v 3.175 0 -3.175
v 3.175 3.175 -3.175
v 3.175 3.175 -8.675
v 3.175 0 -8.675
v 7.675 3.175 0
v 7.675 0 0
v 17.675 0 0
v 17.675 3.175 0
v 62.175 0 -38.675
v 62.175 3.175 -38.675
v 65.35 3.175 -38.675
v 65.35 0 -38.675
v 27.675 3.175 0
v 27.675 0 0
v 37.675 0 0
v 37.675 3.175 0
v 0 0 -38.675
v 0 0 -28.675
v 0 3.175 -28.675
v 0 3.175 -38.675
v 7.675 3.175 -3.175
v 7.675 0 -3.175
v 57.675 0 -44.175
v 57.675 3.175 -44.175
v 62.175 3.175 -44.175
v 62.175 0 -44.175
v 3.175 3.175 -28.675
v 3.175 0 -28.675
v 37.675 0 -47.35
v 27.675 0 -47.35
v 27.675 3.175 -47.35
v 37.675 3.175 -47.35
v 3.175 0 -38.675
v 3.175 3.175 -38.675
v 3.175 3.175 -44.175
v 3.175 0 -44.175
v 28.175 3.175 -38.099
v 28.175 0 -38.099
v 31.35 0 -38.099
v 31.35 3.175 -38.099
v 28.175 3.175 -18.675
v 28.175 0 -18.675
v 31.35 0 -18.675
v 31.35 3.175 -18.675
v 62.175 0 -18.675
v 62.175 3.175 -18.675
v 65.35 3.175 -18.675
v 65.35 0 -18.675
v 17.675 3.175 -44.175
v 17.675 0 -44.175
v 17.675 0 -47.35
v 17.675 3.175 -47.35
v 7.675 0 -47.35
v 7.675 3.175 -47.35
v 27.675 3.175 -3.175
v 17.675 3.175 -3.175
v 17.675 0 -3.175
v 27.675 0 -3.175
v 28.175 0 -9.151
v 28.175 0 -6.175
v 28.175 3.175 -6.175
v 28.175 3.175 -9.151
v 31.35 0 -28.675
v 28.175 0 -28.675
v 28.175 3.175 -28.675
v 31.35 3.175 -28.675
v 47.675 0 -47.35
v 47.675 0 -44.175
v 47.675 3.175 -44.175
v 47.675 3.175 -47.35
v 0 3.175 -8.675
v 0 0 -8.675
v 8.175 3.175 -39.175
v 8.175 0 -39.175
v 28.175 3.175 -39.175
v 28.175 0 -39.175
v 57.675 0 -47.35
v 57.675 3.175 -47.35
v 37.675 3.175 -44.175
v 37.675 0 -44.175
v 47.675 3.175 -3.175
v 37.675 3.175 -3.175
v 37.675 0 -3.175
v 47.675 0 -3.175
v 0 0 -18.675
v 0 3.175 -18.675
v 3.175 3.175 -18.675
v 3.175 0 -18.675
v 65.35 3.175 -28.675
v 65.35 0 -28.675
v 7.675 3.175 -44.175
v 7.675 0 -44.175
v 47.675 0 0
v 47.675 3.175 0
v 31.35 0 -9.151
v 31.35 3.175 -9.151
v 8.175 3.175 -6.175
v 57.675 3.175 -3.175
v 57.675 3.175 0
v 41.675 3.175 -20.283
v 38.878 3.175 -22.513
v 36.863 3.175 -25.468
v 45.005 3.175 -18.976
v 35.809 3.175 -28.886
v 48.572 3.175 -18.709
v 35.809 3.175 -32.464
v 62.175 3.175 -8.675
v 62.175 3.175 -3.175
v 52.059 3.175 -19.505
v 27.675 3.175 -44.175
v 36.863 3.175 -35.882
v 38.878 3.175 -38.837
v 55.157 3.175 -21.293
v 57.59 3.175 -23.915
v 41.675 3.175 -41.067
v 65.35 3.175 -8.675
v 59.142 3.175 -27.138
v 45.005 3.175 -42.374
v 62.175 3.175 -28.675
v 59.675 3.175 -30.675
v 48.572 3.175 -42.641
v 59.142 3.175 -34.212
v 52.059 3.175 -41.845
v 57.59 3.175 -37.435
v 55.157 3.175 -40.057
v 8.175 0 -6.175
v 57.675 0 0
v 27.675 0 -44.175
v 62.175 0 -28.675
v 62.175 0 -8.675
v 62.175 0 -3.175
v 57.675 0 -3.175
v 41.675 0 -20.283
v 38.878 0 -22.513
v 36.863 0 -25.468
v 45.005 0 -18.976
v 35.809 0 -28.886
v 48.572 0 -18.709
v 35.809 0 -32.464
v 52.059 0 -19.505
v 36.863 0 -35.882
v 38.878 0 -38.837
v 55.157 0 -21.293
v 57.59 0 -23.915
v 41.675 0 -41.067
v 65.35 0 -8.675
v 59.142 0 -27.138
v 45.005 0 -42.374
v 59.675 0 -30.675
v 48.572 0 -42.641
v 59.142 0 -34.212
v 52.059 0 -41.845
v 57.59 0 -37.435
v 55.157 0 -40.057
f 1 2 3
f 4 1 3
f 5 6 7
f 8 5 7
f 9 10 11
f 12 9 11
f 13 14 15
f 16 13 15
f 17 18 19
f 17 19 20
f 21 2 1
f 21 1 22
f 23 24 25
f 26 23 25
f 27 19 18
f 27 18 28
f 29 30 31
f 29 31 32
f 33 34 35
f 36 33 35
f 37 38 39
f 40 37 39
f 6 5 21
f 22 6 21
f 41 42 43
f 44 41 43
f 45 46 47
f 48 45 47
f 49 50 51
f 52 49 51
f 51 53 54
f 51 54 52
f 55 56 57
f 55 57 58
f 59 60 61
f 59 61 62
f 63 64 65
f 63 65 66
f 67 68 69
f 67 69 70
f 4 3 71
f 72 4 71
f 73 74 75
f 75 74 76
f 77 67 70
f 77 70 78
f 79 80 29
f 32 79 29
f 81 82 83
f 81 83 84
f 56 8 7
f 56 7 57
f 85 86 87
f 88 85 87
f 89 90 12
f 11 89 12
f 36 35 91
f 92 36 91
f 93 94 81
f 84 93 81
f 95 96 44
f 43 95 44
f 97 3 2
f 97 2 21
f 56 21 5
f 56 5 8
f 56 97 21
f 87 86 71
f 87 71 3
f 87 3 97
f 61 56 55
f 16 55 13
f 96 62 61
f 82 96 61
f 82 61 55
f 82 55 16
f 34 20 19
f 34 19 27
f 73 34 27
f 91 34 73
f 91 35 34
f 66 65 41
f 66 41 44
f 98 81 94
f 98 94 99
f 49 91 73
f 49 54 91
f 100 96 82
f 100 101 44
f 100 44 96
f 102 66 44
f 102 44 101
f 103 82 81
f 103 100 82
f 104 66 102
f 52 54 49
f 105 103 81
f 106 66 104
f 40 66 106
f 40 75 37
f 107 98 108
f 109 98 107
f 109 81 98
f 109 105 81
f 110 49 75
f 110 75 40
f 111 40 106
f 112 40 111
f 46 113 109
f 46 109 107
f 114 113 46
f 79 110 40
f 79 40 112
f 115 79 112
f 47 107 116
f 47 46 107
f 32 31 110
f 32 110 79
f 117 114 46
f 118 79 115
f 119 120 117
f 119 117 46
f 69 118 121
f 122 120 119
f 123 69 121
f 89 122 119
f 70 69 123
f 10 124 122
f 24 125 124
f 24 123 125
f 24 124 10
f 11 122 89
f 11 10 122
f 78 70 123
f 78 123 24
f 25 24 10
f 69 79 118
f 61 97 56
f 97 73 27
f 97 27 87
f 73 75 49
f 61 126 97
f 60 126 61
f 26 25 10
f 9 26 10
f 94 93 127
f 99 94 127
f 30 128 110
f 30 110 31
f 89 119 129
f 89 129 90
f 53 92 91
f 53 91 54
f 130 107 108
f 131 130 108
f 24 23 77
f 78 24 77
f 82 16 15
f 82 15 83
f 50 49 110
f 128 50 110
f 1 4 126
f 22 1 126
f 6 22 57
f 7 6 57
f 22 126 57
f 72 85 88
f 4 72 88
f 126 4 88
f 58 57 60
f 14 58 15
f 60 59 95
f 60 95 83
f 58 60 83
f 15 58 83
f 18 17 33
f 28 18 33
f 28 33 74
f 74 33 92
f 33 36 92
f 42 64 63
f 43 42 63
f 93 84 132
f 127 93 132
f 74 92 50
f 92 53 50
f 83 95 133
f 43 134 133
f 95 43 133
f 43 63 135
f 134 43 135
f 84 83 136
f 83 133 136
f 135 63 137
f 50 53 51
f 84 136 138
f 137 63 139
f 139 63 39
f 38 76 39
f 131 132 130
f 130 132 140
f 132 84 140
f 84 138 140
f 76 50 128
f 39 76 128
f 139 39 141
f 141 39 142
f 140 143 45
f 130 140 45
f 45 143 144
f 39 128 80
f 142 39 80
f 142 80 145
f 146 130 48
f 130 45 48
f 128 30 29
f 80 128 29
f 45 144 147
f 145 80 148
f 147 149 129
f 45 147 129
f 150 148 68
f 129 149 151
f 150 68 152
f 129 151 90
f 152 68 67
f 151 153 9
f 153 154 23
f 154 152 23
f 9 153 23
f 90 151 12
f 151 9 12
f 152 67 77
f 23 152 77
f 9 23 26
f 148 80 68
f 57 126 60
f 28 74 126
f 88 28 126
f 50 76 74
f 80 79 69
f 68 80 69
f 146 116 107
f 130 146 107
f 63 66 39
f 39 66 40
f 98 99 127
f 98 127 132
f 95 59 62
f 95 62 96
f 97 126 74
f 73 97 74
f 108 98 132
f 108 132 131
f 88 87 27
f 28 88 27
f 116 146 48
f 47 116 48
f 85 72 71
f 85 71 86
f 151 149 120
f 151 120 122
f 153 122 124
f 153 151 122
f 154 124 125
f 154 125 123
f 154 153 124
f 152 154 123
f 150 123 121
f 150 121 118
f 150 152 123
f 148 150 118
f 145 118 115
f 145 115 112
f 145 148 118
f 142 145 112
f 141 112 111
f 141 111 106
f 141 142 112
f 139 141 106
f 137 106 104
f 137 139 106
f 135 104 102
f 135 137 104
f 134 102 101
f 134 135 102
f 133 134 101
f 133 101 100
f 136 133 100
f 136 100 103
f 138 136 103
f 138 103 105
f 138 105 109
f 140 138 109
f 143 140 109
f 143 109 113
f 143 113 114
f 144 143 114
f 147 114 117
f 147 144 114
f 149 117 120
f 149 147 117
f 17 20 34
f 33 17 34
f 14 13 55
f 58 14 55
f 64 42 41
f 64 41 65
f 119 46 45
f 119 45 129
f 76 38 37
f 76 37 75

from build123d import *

# Parameters (mm, degrees)
SKETCH1_W           = 65.35
SKETCH1_H           = 47.35
SKETCH1_R           = 12
SKETCH1_W_2         = 20
SKETCH1_H_2         = 33
BOSS_EXTRUDE1_DEPTH = 3.175
SKETCH2_W           = 10
SKETCH2_H           = 3.175
SKETCH2_W_2         = 4.5
SKETCH2_W_3         = 3.175
SKETCH2_H_2         = 10
SKETCH2_H_3         = 5.5
SKETCH2_H_4         = 9.424306971
SKETCH2_H_5         = 9.524418783
CUT_EXTRUDE1_DEPTH  = 3.175


with BuildPart() as part:
    # Sketch1 → Boss-Extrude1 (new body)
    with BuildSketch(Plane(origin=(0, 0, 0), x_dir=(1, 0, 0), z_dir=(0, 1, 0))):
        with Locations((32.675, 23.675)):
            Rectangle(SKETCH1_W, SKETCH1_H)
        with Locations((47.675, 30.675)):
            Circle(SKETCH1_R, mode=Mode.SUBTRACT)
        with Locations((18.175, 22.675)):
            Rectangle(SKETCH1_W_2, SKETCH1_H_2, mode=Mode.SUBTRACT)
    extrude(amount=BOSS_EXTRUDE1_DEPTH)

    # Sketch2 → Cut-Extrude1 (cut)
    with BuildSketch(Plane(origin=(0, 3.175, 0), x_dir=(1, 0, 0), z_dir=(0, 1, 0))):
        with Locations((22.675, 45.7625)):
            Rectangle(SKETCH2_W, SKETCH2_H)
        with Locations((42.675, 45.7625)):
            Rectangle(SKETCH2_W, SKETCH2_H)
        with Locations((59.925, 45.7625)):
            Rectangle(SKETCH2_W_2, SKETCH2_H)
        Polygon((65.35, 47.35), (62.175, 47.35), (62.175, 44.175), (62.175, 38.675), (65.35, 38.675), align=None)
        with Locations((63.7625, 23.675)):
            Rectangle(SKETCH2_W_3, SKETCH2_H_2)
        Polygon((62.175, 3.175), (62.175, 0), (65.35, 0), (65.35, 8.675), (62.175, 8.675), align=None)
        with Locations((59.925, 1.5875)):
            Rectangle(SKETCH2_W_2, SKETCH2_H)
        with Locations((42.675, 1.5875)):
            Rectangle(SKETCH2_W, SKETCH2_H)
        with Locations((22.675, 1.5875)):
            Rectangle(SKETCH2_W, SKETCH2_H)
        with Locations((5.425, 1.5875)):
            Rectangle(SKETCH2_W_2, SKETCH2_H)
        Polygon((3.175, 3.175), (3.175, 8.675), (0, 8.675), (0, 0), (3.175, 0), align=None)
        with Locations((1.5875, 23.675)):
            Rectangle(SKETCH2_W_3, SKETCH2_H_2)
        with Locations((1.5875, 41.425)):
            Rectangle(SKETCH2_W_3, SKETCH2_H_3)
        with Locations((5.425, 45.7625)):
            Rectangle(SKETCH2_W_2, SKETCH2_H)
        with Locations((1.5875, 45.7625)):
            Rectangle(SKETCH2_W_3, SKETCH2_H)
        with Locations((29.7625, 33.387153486)):
            Rectangle(SKETCH2_W_3, SKETCH2_H_4)
        with Locations((29.7625, 13.912790608)):
            Rectangle(SKETCH2_W_3, SKETCH2_H_5)
    extrude(amount=-CUT_EXTRUDE1_DEPTH, mode=Mode.SUBTRACT)


solid = part.part
